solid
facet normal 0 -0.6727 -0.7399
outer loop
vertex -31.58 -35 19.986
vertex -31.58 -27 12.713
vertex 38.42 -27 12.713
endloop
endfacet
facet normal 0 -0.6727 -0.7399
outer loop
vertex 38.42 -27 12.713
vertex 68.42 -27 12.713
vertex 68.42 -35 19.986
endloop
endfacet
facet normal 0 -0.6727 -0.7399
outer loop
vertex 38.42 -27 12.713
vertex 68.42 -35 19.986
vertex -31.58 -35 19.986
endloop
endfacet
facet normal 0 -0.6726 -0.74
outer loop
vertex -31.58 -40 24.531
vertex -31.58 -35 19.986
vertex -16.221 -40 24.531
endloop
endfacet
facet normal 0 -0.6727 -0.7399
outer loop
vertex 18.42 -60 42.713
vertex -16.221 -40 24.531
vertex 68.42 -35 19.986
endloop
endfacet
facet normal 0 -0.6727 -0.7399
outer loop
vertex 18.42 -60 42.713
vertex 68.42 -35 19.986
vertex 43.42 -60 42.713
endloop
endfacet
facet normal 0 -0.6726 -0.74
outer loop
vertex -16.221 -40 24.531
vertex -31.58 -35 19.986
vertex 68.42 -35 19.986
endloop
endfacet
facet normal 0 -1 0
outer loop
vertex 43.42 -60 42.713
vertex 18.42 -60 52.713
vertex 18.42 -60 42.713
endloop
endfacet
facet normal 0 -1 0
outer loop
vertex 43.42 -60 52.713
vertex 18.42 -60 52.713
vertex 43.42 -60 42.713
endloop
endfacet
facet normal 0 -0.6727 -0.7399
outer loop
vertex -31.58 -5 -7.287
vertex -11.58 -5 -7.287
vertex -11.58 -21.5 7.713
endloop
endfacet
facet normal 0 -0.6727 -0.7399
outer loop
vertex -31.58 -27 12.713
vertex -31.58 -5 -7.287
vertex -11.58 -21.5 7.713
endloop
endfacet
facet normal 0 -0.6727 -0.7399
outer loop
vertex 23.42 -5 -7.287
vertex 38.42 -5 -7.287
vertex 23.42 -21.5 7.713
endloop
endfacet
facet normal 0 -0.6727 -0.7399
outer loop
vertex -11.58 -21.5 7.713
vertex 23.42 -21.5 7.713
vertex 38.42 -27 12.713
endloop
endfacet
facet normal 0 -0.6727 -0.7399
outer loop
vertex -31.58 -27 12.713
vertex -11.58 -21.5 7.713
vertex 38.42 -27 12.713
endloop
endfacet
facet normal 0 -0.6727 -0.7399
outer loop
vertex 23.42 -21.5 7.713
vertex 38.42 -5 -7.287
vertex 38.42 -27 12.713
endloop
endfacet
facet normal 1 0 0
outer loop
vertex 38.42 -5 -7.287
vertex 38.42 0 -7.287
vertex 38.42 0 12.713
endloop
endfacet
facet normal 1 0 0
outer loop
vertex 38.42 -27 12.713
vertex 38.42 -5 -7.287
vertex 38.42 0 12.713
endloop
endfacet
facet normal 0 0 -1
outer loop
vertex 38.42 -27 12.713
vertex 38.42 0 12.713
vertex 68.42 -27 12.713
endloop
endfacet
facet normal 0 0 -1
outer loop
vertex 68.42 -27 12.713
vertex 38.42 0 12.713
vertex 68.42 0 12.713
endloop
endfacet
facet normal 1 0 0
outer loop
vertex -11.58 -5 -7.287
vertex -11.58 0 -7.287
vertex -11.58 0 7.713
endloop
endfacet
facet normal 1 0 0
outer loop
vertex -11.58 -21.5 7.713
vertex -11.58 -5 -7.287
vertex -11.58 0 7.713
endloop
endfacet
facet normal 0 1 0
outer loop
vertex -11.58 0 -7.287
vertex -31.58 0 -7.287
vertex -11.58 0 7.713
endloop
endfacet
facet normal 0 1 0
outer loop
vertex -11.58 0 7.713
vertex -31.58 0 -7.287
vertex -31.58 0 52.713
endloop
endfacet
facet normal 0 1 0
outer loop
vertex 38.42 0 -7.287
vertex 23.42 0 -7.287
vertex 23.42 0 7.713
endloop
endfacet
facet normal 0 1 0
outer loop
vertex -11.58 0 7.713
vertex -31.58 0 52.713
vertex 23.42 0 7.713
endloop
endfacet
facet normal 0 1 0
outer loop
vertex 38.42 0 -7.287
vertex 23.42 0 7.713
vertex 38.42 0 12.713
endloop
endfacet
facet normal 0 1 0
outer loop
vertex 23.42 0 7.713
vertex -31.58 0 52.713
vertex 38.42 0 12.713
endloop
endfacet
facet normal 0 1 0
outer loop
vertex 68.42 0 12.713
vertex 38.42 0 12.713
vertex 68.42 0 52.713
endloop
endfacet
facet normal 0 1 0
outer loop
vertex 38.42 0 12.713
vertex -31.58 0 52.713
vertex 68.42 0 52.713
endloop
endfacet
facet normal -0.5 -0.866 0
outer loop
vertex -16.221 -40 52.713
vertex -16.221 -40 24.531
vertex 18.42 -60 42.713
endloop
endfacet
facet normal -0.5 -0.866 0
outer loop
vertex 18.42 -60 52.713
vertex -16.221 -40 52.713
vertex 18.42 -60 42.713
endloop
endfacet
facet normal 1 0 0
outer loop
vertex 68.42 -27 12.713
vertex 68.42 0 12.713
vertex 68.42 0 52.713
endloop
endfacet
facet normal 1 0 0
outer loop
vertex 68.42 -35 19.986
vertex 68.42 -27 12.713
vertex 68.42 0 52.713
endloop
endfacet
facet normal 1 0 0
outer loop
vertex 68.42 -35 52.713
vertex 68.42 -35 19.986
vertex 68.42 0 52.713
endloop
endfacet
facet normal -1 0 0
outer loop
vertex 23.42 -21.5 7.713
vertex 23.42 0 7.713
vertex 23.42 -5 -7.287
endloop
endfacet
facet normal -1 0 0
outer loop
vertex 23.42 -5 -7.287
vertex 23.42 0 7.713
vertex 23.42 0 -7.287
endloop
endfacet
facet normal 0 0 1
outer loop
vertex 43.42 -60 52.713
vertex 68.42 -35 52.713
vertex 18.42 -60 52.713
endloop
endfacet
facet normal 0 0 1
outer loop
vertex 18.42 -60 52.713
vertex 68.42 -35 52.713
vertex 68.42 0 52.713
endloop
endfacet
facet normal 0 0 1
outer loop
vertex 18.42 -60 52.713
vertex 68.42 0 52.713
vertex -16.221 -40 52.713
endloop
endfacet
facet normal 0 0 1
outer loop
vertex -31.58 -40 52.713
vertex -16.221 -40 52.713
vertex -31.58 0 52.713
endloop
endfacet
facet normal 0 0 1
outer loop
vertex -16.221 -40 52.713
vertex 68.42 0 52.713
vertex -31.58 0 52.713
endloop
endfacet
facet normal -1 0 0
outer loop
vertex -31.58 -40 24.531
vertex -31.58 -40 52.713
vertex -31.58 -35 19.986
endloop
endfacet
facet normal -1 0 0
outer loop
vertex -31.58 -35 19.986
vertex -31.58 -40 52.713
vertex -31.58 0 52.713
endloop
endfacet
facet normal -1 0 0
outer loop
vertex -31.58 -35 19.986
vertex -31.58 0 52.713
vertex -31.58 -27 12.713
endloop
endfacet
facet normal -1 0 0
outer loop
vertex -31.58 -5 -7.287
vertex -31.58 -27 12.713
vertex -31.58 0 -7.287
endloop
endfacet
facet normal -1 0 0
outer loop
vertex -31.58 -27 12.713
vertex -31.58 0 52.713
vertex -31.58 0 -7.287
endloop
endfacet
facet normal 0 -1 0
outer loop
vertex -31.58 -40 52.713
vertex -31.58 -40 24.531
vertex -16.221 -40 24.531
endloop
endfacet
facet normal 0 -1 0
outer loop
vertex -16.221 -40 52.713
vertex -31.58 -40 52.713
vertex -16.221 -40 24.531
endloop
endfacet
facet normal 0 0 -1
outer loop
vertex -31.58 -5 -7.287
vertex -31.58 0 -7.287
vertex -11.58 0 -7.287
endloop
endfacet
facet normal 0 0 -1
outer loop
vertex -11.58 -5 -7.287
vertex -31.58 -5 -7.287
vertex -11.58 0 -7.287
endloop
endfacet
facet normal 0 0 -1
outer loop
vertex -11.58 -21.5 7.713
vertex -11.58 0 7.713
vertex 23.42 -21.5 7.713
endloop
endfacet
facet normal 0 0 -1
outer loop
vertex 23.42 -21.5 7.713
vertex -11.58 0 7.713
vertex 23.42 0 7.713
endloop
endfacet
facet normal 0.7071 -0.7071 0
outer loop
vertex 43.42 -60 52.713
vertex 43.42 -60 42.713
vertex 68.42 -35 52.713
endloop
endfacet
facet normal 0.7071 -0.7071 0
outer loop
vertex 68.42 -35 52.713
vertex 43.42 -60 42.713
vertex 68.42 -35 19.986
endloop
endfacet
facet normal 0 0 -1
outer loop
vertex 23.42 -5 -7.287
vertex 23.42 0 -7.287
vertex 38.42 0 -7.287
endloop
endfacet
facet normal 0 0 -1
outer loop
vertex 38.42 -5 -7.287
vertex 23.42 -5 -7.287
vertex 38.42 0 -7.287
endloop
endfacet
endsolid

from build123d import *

# Parameters (mm, degrees)
F1_DEPTH = 60
F3_DEPTH = 60.001
F5_DEPTH = 100.001


with BuildPart() as f1:
    # F0 (on Front) → F1 (new body)
    with BuildSketch(Plane.XZ):
        Polygon((68.4196182877, 52.7130502019), (-31.5803817123, 52.7130502019), (-31.5803817123, -7.2869497981), (-11.5803817123, -7.2869497981), (-11.5803817123, 7.7130502019), (23.4196182877, 7.7130502019), (23.4196182877, -7.2869497981), (38.4196182877, -7.2869497981), (38.4196182877, 12.7130502019), (68.4196182877, 12.7130502019), align=None)
    extrude(amount=F1_DEPTH)

    # F2 (on face) → F3 (cut, through all)
    with BuildSketch(Plane(origin=(0, 0, -7.2869497981), x_dir=(1, 0, 0), z_dir=(0, 0, -1))):
        Polygon((68.4196182877, 60), (43.4196182877, 60), (68.4196182877, 35), align=None)
        Polygon((18.4196182877, 60), (-31.5803817123, 60), (-31.5803817123, 40), (-16.2213978636, 40), align=None)
    extrude(amount=-F3_DEPTH, mode=Mode.SUBTRACT)

    # F4 (on face) → F5 (cut, through all)
    with BuildSketch(Plane.YZ.offset(68.4196182877)):
        Polygon((-60, 42.7130502019), (-60, -7.2869497981), (-5, -7.2869497981), (-27, 12.7130502019), (-35, 12.7130502019), (-35, 19.9857774746), align=None)
        Polygon((-35, 12.7130502019), (-27, 12.7130502019), (-35, 19.9857774746), align=None)
    extrude(amount=-F5_DEPTH, mode=Mode.SUBTRACT)


solid = f1.part
